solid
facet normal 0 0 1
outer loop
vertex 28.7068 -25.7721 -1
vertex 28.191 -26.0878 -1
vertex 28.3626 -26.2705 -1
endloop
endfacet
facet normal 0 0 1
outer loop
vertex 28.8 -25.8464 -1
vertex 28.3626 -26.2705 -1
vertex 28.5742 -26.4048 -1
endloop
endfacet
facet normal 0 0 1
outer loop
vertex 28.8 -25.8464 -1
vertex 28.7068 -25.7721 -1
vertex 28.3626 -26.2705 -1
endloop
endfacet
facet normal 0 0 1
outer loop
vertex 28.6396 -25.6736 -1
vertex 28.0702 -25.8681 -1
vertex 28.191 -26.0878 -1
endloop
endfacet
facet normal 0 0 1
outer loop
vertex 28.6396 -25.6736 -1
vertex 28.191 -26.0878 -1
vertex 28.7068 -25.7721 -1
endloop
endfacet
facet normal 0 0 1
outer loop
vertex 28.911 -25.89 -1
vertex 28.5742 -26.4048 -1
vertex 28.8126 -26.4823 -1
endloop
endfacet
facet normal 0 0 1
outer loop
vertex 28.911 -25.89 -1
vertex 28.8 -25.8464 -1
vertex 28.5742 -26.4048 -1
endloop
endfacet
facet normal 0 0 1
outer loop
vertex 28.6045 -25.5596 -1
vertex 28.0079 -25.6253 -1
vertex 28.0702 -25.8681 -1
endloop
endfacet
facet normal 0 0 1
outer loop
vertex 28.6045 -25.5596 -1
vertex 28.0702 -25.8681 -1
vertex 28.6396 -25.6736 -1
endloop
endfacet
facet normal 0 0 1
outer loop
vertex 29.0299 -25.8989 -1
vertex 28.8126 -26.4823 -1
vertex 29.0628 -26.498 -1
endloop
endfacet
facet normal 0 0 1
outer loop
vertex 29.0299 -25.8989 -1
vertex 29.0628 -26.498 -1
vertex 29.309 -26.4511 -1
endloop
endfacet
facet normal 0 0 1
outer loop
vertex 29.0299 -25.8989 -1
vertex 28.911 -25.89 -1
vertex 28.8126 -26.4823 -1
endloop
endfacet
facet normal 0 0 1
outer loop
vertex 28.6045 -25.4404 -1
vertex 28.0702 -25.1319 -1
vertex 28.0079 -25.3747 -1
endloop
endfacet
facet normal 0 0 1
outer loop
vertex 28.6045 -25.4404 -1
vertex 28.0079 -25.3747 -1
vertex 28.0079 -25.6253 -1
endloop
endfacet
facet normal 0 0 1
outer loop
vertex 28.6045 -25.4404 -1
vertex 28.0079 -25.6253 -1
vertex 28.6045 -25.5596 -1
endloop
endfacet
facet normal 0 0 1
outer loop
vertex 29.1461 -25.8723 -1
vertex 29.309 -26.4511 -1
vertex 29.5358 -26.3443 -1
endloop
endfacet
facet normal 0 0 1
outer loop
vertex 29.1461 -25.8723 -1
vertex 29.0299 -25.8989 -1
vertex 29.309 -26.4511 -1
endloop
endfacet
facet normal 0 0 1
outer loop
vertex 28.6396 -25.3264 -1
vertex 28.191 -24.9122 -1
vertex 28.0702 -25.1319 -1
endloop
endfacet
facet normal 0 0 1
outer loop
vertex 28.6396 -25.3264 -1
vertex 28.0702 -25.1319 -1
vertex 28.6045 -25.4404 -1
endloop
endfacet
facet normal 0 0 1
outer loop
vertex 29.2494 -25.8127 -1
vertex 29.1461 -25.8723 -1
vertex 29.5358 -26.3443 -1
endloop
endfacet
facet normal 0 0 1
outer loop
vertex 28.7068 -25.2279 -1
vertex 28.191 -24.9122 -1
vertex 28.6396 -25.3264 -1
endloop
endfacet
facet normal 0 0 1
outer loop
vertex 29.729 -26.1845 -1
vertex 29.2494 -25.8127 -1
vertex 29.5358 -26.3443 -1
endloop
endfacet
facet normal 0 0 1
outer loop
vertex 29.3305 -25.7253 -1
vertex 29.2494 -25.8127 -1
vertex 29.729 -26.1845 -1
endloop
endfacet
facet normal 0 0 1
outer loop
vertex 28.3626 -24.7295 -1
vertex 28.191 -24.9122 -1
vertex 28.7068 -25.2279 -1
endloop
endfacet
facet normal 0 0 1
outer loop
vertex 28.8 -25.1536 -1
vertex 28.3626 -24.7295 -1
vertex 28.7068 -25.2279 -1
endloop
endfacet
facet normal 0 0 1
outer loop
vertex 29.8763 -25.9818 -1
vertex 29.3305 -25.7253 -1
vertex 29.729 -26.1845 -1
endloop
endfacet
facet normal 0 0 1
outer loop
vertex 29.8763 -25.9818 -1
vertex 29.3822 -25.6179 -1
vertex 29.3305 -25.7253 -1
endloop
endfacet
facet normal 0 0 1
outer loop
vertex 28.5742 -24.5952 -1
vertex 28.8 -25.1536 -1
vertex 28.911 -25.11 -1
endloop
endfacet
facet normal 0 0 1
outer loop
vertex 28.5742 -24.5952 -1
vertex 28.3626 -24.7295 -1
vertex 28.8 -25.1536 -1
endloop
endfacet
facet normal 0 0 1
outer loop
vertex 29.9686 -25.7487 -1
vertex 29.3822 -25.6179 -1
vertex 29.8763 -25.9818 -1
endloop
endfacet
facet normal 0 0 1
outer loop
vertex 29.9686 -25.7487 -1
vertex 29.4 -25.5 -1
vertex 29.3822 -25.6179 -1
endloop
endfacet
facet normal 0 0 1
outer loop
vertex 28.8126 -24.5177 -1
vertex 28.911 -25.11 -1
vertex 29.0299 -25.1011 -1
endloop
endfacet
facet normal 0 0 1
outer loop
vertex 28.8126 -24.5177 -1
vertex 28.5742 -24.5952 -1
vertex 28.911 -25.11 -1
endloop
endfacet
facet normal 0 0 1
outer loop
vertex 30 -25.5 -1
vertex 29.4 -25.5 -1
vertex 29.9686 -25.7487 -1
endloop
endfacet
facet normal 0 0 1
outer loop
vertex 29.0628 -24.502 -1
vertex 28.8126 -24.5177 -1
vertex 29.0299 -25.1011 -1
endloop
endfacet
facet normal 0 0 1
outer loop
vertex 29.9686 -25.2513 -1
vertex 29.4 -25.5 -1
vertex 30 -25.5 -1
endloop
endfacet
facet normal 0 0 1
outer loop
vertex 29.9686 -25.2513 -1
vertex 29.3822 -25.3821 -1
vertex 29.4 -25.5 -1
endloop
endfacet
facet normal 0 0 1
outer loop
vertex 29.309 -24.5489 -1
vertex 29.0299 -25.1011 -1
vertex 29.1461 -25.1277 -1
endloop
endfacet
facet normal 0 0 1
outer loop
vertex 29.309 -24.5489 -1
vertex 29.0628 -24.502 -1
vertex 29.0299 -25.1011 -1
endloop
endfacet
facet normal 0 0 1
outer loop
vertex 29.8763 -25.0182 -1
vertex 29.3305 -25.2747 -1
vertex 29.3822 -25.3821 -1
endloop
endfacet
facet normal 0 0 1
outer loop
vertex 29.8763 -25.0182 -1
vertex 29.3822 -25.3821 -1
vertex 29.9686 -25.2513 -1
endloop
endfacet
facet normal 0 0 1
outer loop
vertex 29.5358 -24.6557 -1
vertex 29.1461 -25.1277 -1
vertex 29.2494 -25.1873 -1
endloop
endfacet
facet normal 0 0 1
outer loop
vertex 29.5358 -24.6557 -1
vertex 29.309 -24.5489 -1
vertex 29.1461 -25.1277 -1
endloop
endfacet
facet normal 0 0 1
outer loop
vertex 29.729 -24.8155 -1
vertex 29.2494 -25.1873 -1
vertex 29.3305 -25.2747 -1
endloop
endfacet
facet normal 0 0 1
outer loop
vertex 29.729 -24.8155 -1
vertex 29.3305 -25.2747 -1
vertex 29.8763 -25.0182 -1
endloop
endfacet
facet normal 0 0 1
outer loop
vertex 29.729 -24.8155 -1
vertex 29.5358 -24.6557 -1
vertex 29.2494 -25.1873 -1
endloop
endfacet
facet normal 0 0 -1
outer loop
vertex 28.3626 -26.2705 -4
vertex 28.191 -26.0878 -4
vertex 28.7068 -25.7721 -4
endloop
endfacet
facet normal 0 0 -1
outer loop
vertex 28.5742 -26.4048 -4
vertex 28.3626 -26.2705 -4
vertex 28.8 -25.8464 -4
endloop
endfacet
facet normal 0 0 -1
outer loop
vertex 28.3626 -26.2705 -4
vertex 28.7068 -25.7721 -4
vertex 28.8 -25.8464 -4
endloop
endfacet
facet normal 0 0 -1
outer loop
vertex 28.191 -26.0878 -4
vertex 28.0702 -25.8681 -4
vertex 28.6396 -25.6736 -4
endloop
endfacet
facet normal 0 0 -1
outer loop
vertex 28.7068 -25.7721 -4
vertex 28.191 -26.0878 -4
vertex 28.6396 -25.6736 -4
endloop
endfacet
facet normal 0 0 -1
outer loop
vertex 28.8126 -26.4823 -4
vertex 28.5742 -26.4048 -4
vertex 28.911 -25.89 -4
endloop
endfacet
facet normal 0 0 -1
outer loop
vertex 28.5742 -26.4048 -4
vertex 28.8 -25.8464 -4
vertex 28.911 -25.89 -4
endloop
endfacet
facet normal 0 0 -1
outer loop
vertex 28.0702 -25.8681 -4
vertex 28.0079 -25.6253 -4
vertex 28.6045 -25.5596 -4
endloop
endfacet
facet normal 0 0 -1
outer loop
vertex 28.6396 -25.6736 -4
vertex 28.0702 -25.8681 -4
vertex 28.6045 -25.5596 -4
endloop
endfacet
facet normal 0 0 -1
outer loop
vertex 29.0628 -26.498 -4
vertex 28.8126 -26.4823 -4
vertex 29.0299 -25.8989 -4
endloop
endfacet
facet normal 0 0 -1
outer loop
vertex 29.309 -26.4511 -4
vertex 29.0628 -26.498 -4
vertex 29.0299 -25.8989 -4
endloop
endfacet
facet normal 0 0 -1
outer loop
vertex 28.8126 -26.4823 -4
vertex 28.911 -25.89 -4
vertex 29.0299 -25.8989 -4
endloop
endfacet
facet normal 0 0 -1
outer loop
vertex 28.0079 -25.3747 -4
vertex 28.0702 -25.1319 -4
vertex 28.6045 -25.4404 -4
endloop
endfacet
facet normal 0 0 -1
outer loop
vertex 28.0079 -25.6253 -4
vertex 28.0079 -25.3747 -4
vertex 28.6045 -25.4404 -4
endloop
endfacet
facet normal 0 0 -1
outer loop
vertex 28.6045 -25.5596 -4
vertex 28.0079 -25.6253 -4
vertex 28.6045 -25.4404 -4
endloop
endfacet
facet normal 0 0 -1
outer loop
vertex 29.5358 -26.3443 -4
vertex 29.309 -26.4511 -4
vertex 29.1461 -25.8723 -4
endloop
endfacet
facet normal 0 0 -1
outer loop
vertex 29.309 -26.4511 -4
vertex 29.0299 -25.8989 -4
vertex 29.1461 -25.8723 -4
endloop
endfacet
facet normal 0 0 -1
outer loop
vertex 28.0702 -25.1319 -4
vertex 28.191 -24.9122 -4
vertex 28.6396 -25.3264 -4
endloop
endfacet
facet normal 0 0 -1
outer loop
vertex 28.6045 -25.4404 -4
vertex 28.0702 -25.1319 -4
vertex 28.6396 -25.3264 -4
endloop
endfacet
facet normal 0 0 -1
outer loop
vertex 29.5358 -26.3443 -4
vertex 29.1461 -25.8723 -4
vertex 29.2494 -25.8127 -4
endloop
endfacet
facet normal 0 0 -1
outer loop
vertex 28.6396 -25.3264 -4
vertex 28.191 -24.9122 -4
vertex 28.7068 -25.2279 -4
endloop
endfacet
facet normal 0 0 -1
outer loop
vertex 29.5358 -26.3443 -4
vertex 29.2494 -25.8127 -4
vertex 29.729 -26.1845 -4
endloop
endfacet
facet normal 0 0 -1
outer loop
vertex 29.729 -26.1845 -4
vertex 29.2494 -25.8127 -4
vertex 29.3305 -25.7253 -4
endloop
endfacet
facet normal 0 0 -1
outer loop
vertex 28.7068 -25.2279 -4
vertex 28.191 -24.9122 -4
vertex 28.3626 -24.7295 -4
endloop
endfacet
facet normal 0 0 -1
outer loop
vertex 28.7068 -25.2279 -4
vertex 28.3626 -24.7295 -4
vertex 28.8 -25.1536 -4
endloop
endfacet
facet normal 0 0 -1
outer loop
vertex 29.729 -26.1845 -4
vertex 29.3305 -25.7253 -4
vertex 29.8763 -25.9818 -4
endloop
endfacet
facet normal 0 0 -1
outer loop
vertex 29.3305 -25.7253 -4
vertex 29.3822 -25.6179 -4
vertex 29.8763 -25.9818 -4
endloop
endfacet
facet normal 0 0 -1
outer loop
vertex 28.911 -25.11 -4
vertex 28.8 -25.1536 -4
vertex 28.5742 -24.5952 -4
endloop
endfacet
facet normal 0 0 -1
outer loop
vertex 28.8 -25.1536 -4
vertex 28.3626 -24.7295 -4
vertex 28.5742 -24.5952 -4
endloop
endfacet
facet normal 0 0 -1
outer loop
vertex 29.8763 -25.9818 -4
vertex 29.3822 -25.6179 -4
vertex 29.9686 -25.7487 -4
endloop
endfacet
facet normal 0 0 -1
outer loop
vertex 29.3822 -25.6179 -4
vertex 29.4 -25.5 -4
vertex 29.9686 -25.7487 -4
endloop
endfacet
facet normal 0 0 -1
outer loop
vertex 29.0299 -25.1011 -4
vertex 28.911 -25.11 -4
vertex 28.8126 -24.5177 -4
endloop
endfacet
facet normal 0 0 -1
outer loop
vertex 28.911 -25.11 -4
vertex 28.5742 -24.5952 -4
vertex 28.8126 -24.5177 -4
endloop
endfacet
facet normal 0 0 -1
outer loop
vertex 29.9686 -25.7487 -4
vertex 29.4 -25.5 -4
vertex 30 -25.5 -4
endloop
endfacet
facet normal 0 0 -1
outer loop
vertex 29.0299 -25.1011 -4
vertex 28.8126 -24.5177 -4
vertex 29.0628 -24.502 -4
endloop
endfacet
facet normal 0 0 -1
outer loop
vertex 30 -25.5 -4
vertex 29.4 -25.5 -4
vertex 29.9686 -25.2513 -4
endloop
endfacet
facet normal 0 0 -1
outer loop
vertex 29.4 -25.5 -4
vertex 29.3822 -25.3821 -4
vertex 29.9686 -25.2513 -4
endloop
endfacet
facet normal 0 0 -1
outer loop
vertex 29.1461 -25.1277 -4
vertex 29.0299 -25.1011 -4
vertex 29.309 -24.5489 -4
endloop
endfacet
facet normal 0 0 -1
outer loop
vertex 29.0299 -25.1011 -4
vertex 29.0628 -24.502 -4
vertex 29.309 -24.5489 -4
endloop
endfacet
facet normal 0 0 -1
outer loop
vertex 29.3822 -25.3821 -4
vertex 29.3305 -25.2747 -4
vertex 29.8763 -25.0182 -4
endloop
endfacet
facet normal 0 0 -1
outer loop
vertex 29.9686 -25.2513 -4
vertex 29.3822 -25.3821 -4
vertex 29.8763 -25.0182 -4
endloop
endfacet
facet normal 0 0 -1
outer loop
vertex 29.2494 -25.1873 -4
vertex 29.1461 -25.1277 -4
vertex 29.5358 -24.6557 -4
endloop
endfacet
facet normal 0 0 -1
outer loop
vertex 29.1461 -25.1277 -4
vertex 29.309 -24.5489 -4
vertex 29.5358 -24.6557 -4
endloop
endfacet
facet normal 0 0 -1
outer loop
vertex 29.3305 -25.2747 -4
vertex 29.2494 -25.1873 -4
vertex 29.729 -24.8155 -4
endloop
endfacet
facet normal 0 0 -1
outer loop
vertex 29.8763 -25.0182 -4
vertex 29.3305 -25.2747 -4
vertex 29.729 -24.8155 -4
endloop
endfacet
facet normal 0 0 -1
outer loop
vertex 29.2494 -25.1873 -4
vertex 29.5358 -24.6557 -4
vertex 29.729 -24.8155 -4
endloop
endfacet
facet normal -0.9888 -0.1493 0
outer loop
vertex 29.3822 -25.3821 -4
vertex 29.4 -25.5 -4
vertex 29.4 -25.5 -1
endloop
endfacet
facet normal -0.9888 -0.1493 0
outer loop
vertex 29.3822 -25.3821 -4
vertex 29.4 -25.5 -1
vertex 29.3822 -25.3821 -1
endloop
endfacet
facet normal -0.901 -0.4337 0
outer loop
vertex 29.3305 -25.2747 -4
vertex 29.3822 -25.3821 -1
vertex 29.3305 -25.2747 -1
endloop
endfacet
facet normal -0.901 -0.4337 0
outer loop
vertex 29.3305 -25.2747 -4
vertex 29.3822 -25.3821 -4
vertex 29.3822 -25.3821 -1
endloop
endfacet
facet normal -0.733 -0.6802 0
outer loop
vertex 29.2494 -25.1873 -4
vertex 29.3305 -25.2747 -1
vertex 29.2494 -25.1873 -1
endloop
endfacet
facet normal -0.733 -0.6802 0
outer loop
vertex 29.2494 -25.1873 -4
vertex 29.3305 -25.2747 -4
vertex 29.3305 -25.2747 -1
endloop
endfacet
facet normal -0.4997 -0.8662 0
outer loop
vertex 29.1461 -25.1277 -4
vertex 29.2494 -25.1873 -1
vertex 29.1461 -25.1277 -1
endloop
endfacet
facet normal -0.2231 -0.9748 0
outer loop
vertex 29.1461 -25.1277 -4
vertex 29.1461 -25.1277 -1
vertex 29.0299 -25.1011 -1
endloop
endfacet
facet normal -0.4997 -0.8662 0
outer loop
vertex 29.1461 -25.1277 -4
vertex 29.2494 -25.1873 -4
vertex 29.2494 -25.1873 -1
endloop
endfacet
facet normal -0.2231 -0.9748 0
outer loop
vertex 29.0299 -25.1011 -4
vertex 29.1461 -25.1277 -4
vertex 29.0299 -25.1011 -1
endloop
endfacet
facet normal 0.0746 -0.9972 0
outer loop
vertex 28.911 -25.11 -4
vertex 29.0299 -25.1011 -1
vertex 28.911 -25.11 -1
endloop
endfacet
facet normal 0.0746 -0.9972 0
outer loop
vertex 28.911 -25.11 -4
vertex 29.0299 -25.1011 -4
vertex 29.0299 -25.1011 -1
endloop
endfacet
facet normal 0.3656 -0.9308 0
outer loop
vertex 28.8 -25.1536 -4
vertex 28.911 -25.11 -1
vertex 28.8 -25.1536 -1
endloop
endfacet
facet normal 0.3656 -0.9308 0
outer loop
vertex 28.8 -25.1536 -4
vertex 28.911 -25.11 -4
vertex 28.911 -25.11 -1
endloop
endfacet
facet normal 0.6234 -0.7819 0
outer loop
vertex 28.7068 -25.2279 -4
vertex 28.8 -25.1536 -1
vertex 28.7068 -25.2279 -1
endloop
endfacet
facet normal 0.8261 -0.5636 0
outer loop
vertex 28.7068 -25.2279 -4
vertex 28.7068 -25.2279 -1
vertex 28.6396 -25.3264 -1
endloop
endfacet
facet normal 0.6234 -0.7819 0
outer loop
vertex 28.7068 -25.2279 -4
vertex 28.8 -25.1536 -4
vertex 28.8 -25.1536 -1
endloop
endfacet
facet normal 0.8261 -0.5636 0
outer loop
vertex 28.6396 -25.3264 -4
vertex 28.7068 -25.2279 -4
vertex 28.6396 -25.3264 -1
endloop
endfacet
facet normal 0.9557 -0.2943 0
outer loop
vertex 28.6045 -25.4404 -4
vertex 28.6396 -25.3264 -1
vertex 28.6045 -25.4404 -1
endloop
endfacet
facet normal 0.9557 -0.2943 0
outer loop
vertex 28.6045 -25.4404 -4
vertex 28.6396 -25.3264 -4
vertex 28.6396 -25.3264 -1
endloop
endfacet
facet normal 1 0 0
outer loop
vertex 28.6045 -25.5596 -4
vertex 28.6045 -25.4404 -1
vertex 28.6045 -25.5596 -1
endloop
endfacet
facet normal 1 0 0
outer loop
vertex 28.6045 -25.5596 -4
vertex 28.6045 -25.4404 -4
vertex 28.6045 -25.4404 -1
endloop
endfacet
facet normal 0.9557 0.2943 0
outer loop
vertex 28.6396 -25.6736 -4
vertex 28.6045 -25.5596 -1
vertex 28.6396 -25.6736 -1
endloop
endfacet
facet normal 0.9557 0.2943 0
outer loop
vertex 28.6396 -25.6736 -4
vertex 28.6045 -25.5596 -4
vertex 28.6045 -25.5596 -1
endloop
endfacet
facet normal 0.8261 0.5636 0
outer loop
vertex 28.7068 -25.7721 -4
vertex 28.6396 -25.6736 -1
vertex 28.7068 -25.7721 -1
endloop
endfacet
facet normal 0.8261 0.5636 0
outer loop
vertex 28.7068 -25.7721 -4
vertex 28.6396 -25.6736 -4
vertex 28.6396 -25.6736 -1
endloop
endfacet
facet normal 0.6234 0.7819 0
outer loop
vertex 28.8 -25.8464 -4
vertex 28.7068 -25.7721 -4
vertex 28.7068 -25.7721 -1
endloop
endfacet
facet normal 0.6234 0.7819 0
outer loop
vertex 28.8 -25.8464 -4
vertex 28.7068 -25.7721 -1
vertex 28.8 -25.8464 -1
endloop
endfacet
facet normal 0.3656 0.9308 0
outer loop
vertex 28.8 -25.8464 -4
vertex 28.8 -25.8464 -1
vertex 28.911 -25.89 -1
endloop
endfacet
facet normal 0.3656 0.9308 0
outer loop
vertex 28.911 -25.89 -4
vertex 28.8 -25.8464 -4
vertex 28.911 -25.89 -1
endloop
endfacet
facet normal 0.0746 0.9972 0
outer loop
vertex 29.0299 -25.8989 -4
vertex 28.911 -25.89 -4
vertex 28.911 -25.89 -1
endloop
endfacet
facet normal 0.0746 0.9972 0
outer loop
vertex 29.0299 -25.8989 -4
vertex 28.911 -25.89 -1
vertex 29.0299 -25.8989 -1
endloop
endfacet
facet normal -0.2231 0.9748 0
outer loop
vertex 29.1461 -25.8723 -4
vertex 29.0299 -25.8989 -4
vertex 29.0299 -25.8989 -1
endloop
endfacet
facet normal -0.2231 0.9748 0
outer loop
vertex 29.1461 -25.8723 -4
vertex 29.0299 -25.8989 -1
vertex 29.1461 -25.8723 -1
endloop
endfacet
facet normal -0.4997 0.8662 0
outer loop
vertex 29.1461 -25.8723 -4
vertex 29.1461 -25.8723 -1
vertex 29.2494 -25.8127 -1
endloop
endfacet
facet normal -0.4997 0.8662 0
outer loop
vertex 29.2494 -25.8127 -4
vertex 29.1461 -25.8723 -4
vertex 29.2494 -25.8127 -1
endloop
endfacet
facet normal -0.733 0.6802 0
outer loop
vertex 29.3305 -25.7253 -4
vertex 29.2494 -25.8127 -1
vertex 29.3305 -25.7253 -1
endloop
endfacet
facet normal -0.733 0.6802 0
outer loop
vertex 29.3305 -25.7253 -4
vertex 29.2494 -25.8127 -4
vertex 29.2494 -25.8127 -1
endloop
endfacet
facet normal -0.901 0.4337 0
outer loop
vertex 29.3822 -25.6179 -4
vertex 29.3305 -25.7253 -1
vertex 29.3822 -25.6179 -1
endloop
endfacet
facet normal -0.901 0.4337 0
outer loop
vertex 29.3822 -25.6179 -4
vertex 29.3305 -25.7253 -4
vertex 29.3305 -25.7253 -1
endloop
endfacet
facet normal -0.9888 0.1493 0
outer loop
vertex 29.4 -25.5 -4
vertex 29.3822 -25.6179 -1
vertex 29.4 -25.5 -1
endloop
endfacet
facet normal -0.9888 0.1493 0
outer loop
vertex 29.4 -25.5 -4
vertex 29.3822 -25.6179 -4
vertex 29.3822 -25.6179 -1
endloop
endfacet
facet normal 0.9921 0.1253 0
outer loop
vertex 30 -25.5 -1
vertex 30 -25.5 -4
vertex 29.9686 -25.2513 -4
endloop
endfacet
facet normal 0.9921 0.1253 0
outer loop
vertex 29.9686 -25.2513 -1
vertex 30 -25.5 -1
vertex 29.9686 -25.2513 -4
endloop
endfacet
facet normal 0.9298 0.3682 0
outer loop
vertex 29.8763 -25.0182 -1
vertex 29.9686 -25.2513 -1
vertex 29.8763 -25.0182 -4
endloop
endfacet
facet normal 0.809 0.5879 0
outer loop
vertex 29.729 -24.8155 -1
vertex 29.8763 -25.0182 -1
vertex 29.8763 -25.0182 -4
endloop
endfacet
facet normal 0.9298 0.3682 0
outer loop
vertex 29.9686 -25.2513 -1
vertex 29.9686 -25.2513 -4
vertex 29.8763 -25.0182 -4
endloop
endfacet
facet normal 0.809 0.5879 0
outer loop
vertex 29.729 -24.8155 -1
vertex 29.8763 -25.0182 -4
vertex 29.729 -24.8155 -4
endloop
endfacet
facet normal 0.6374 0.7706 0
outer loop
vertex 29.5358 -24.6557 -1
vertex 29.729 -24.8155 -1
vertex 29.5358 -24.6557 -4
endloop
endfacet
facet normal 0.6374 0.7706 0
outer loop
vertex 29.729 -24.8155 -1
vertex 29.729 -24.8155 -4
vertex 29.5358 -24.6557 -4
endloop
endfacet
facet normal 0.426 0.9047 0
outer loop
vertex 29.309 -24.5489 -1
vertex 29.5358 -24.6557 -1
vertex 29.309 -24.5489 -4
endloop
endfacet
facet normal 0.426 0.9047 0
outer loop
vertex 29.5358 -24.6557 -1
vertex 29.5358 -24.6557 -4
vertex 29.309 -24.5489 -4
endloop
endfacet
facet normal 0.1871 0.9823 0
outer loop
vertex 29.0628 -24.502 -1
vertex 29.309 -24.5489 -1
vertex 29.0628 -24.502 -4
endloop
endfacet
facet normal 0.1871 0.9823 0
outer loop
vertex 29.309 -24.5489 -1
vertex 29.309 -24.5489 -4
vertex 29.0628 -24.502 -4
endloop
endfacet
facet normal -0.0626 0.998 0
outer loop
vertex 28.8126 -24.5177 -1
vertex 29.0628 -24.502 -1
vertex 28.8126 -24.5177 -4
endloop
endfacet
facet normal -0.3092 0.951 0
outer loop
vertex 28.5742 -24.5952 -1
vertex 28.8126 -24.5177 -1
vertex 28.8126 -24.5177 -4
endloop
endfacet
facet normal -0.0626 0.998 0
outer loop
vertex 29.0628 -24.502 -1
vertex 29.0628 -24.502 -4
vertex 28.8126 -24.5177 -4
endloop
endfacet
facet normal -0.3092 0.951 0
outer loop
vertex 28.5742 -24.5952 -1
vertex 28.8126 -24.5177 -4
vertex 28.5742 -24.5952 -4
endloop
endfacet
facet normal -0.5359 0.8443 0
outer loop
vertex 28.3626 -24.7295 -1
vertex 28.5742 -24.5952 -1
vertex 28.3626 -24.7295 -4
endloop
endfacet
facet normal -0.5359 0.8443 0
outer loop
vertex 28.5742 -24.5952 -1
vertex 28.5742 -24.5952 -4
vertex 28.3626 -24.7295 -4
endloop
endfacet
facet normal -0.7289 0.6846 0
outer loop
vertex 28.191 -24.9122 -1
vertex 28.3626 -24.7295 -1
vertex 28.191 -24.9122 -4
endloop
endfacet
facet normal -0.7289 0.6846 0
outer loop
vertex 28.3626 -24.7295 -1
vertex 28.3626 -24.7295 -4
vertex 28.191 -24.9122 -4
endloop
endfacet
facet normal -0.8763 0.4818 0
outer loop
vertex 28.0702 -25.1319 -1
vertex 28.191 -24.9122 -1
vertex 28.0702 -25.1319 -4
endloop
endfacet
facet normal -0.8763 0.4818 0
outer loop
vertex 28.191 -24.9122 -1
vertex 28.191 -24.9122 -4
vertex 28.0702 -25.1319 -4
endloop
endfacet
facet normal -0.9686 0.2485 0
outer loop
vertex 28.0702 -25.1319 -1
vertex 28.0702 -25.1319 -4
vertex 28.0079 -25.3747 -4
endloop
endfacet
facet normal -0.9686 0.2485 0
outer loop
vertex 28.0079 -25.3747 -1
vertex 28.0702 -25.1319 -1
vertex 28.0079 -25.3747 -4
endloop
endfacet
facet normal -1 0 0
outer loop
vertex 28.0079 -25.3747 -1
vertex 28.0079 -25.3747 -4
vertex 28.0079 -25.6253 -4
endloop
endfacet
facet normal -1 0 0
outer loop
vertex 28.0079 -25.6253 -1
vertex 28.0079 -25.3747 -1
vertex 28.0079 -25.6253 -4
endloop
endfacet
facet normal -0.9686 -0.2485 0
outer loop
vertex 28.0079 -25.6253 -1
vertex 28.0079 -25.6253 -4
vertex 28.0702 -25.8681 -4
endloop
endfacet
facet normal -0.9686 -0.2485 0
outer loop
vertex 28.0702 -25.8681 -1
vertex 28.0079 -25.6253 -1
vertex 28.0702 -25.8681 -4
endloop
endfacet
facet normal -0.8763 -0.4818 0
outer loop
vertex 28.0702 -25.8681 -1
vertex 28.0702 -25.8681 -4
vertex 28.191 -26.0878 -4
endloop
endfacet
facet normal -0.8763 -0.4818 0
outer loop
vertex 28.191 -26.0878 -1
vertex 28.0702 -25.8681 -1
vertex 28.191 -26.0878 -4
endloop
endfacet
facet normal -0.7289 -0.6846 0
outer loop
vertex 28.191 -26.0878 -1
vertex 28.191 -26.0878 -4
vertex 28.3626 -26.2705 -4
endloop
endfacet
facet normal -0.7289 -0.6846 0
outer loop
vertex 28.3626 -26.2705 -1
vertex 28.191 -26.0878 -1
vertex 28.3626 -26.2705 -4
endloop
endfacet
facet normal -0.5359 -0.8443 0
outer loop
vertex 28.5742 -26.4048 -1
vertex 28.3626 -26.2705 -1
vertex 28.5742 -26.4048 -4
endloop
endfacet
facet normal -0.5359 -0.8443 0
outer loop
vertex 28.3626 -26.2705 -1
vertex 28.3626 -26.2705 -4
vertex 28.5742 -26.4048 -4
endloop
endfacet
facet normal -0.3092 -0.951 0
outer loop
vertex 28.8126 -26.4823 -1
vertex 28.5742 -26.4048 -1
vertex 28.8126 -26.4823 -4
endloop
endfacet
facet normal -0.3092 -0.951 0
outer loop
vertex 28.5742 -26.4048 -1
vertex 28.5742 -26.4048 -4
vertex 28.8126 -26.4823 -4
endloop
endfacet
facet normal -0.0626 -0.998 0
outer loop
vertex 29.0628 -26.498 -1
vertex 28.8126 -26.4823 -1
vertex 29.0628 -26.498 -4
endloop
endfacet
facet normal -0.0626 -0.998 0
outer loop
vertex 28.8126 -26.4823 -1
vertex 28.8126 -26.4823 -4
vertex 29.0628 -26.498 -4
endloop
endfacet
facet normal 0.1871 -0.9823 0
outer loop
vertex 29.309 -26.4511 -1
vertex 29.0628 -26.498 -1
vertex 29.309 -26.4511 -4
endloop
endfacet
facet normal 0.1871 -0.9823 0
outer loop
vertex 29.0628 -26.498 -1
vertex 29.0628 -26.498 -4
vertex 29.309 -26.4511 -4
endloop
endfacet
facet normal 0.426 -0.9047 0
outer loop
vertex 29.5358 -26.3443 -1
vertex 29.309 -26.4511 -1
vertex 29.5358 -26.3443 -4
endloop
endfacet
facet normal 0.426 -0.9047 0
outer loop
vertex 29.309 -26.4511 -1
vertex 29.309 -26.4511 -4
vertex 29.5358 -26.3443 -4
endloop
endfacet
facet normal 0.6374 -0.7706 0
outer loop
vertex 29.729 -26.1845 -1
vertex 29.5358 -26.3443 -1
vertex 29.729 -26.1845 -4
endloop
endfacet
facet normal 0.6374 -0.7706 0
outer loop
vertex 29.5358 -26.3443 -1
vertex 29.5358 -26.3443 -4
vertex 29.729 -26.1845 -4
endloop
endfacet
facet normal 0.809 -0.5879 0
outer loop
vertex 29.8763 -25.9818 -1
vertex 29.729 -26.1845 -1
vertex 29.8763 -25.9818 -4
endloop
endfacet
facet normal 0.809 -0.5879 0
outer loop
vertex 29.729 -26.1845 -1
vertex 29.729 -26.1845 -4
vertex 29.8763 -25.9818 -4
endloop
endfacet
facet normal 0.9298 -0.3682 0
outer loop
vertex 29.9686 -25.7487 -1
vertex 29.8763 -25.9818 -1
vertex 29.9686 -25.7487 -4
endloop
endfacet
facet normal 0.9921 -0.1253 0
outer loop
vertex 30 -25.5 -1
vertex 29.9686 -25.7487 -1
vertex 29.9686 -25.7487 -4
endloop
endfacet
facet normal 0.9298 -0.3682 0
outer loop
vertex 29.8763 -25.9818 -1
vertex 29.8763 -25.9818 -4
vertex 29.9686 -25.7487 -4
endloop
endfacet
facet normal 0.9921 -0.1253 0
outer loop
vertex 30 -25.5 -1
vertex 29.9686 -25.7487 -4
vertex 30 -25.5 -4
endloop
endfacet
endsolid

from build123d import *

# Parameters (mm, degrees)
CYLINDER004_R     = 0.4
CYLINDER004_DEPTH = 3
CYLINDER001_R     = 1
CYLINDER001_DEPTH = 3


with BuildPart() as cylinder004:
    # Cylinder004 → Cylinder004 (new body)
    with BuildSketch(Plane(origin=(29, -25.5, -4), x_dir=(1, 0, 0), z_dir=(0, 0, 1))):
        Circle(CYLINDER004_R)
    extrude(amount=CYLINDER004_DEPTH)


with BuildPart() as cut006:
    # Cylinder001 → Cylinder001 (new body)
    with BuildSketch(Plane(origin=(29, -25.5, -4), x_dir=(1, 0, 0), z_dir=(0, 0, 1))):
        Circle(CYLINDER001_R)
    extrude(amount=CYLINDER001_DEPTH)

    # Cut006: cut Cylinder004
    add(cylinder004.part, mode=Mode.SUBTRACT)


solid = cut006.part
